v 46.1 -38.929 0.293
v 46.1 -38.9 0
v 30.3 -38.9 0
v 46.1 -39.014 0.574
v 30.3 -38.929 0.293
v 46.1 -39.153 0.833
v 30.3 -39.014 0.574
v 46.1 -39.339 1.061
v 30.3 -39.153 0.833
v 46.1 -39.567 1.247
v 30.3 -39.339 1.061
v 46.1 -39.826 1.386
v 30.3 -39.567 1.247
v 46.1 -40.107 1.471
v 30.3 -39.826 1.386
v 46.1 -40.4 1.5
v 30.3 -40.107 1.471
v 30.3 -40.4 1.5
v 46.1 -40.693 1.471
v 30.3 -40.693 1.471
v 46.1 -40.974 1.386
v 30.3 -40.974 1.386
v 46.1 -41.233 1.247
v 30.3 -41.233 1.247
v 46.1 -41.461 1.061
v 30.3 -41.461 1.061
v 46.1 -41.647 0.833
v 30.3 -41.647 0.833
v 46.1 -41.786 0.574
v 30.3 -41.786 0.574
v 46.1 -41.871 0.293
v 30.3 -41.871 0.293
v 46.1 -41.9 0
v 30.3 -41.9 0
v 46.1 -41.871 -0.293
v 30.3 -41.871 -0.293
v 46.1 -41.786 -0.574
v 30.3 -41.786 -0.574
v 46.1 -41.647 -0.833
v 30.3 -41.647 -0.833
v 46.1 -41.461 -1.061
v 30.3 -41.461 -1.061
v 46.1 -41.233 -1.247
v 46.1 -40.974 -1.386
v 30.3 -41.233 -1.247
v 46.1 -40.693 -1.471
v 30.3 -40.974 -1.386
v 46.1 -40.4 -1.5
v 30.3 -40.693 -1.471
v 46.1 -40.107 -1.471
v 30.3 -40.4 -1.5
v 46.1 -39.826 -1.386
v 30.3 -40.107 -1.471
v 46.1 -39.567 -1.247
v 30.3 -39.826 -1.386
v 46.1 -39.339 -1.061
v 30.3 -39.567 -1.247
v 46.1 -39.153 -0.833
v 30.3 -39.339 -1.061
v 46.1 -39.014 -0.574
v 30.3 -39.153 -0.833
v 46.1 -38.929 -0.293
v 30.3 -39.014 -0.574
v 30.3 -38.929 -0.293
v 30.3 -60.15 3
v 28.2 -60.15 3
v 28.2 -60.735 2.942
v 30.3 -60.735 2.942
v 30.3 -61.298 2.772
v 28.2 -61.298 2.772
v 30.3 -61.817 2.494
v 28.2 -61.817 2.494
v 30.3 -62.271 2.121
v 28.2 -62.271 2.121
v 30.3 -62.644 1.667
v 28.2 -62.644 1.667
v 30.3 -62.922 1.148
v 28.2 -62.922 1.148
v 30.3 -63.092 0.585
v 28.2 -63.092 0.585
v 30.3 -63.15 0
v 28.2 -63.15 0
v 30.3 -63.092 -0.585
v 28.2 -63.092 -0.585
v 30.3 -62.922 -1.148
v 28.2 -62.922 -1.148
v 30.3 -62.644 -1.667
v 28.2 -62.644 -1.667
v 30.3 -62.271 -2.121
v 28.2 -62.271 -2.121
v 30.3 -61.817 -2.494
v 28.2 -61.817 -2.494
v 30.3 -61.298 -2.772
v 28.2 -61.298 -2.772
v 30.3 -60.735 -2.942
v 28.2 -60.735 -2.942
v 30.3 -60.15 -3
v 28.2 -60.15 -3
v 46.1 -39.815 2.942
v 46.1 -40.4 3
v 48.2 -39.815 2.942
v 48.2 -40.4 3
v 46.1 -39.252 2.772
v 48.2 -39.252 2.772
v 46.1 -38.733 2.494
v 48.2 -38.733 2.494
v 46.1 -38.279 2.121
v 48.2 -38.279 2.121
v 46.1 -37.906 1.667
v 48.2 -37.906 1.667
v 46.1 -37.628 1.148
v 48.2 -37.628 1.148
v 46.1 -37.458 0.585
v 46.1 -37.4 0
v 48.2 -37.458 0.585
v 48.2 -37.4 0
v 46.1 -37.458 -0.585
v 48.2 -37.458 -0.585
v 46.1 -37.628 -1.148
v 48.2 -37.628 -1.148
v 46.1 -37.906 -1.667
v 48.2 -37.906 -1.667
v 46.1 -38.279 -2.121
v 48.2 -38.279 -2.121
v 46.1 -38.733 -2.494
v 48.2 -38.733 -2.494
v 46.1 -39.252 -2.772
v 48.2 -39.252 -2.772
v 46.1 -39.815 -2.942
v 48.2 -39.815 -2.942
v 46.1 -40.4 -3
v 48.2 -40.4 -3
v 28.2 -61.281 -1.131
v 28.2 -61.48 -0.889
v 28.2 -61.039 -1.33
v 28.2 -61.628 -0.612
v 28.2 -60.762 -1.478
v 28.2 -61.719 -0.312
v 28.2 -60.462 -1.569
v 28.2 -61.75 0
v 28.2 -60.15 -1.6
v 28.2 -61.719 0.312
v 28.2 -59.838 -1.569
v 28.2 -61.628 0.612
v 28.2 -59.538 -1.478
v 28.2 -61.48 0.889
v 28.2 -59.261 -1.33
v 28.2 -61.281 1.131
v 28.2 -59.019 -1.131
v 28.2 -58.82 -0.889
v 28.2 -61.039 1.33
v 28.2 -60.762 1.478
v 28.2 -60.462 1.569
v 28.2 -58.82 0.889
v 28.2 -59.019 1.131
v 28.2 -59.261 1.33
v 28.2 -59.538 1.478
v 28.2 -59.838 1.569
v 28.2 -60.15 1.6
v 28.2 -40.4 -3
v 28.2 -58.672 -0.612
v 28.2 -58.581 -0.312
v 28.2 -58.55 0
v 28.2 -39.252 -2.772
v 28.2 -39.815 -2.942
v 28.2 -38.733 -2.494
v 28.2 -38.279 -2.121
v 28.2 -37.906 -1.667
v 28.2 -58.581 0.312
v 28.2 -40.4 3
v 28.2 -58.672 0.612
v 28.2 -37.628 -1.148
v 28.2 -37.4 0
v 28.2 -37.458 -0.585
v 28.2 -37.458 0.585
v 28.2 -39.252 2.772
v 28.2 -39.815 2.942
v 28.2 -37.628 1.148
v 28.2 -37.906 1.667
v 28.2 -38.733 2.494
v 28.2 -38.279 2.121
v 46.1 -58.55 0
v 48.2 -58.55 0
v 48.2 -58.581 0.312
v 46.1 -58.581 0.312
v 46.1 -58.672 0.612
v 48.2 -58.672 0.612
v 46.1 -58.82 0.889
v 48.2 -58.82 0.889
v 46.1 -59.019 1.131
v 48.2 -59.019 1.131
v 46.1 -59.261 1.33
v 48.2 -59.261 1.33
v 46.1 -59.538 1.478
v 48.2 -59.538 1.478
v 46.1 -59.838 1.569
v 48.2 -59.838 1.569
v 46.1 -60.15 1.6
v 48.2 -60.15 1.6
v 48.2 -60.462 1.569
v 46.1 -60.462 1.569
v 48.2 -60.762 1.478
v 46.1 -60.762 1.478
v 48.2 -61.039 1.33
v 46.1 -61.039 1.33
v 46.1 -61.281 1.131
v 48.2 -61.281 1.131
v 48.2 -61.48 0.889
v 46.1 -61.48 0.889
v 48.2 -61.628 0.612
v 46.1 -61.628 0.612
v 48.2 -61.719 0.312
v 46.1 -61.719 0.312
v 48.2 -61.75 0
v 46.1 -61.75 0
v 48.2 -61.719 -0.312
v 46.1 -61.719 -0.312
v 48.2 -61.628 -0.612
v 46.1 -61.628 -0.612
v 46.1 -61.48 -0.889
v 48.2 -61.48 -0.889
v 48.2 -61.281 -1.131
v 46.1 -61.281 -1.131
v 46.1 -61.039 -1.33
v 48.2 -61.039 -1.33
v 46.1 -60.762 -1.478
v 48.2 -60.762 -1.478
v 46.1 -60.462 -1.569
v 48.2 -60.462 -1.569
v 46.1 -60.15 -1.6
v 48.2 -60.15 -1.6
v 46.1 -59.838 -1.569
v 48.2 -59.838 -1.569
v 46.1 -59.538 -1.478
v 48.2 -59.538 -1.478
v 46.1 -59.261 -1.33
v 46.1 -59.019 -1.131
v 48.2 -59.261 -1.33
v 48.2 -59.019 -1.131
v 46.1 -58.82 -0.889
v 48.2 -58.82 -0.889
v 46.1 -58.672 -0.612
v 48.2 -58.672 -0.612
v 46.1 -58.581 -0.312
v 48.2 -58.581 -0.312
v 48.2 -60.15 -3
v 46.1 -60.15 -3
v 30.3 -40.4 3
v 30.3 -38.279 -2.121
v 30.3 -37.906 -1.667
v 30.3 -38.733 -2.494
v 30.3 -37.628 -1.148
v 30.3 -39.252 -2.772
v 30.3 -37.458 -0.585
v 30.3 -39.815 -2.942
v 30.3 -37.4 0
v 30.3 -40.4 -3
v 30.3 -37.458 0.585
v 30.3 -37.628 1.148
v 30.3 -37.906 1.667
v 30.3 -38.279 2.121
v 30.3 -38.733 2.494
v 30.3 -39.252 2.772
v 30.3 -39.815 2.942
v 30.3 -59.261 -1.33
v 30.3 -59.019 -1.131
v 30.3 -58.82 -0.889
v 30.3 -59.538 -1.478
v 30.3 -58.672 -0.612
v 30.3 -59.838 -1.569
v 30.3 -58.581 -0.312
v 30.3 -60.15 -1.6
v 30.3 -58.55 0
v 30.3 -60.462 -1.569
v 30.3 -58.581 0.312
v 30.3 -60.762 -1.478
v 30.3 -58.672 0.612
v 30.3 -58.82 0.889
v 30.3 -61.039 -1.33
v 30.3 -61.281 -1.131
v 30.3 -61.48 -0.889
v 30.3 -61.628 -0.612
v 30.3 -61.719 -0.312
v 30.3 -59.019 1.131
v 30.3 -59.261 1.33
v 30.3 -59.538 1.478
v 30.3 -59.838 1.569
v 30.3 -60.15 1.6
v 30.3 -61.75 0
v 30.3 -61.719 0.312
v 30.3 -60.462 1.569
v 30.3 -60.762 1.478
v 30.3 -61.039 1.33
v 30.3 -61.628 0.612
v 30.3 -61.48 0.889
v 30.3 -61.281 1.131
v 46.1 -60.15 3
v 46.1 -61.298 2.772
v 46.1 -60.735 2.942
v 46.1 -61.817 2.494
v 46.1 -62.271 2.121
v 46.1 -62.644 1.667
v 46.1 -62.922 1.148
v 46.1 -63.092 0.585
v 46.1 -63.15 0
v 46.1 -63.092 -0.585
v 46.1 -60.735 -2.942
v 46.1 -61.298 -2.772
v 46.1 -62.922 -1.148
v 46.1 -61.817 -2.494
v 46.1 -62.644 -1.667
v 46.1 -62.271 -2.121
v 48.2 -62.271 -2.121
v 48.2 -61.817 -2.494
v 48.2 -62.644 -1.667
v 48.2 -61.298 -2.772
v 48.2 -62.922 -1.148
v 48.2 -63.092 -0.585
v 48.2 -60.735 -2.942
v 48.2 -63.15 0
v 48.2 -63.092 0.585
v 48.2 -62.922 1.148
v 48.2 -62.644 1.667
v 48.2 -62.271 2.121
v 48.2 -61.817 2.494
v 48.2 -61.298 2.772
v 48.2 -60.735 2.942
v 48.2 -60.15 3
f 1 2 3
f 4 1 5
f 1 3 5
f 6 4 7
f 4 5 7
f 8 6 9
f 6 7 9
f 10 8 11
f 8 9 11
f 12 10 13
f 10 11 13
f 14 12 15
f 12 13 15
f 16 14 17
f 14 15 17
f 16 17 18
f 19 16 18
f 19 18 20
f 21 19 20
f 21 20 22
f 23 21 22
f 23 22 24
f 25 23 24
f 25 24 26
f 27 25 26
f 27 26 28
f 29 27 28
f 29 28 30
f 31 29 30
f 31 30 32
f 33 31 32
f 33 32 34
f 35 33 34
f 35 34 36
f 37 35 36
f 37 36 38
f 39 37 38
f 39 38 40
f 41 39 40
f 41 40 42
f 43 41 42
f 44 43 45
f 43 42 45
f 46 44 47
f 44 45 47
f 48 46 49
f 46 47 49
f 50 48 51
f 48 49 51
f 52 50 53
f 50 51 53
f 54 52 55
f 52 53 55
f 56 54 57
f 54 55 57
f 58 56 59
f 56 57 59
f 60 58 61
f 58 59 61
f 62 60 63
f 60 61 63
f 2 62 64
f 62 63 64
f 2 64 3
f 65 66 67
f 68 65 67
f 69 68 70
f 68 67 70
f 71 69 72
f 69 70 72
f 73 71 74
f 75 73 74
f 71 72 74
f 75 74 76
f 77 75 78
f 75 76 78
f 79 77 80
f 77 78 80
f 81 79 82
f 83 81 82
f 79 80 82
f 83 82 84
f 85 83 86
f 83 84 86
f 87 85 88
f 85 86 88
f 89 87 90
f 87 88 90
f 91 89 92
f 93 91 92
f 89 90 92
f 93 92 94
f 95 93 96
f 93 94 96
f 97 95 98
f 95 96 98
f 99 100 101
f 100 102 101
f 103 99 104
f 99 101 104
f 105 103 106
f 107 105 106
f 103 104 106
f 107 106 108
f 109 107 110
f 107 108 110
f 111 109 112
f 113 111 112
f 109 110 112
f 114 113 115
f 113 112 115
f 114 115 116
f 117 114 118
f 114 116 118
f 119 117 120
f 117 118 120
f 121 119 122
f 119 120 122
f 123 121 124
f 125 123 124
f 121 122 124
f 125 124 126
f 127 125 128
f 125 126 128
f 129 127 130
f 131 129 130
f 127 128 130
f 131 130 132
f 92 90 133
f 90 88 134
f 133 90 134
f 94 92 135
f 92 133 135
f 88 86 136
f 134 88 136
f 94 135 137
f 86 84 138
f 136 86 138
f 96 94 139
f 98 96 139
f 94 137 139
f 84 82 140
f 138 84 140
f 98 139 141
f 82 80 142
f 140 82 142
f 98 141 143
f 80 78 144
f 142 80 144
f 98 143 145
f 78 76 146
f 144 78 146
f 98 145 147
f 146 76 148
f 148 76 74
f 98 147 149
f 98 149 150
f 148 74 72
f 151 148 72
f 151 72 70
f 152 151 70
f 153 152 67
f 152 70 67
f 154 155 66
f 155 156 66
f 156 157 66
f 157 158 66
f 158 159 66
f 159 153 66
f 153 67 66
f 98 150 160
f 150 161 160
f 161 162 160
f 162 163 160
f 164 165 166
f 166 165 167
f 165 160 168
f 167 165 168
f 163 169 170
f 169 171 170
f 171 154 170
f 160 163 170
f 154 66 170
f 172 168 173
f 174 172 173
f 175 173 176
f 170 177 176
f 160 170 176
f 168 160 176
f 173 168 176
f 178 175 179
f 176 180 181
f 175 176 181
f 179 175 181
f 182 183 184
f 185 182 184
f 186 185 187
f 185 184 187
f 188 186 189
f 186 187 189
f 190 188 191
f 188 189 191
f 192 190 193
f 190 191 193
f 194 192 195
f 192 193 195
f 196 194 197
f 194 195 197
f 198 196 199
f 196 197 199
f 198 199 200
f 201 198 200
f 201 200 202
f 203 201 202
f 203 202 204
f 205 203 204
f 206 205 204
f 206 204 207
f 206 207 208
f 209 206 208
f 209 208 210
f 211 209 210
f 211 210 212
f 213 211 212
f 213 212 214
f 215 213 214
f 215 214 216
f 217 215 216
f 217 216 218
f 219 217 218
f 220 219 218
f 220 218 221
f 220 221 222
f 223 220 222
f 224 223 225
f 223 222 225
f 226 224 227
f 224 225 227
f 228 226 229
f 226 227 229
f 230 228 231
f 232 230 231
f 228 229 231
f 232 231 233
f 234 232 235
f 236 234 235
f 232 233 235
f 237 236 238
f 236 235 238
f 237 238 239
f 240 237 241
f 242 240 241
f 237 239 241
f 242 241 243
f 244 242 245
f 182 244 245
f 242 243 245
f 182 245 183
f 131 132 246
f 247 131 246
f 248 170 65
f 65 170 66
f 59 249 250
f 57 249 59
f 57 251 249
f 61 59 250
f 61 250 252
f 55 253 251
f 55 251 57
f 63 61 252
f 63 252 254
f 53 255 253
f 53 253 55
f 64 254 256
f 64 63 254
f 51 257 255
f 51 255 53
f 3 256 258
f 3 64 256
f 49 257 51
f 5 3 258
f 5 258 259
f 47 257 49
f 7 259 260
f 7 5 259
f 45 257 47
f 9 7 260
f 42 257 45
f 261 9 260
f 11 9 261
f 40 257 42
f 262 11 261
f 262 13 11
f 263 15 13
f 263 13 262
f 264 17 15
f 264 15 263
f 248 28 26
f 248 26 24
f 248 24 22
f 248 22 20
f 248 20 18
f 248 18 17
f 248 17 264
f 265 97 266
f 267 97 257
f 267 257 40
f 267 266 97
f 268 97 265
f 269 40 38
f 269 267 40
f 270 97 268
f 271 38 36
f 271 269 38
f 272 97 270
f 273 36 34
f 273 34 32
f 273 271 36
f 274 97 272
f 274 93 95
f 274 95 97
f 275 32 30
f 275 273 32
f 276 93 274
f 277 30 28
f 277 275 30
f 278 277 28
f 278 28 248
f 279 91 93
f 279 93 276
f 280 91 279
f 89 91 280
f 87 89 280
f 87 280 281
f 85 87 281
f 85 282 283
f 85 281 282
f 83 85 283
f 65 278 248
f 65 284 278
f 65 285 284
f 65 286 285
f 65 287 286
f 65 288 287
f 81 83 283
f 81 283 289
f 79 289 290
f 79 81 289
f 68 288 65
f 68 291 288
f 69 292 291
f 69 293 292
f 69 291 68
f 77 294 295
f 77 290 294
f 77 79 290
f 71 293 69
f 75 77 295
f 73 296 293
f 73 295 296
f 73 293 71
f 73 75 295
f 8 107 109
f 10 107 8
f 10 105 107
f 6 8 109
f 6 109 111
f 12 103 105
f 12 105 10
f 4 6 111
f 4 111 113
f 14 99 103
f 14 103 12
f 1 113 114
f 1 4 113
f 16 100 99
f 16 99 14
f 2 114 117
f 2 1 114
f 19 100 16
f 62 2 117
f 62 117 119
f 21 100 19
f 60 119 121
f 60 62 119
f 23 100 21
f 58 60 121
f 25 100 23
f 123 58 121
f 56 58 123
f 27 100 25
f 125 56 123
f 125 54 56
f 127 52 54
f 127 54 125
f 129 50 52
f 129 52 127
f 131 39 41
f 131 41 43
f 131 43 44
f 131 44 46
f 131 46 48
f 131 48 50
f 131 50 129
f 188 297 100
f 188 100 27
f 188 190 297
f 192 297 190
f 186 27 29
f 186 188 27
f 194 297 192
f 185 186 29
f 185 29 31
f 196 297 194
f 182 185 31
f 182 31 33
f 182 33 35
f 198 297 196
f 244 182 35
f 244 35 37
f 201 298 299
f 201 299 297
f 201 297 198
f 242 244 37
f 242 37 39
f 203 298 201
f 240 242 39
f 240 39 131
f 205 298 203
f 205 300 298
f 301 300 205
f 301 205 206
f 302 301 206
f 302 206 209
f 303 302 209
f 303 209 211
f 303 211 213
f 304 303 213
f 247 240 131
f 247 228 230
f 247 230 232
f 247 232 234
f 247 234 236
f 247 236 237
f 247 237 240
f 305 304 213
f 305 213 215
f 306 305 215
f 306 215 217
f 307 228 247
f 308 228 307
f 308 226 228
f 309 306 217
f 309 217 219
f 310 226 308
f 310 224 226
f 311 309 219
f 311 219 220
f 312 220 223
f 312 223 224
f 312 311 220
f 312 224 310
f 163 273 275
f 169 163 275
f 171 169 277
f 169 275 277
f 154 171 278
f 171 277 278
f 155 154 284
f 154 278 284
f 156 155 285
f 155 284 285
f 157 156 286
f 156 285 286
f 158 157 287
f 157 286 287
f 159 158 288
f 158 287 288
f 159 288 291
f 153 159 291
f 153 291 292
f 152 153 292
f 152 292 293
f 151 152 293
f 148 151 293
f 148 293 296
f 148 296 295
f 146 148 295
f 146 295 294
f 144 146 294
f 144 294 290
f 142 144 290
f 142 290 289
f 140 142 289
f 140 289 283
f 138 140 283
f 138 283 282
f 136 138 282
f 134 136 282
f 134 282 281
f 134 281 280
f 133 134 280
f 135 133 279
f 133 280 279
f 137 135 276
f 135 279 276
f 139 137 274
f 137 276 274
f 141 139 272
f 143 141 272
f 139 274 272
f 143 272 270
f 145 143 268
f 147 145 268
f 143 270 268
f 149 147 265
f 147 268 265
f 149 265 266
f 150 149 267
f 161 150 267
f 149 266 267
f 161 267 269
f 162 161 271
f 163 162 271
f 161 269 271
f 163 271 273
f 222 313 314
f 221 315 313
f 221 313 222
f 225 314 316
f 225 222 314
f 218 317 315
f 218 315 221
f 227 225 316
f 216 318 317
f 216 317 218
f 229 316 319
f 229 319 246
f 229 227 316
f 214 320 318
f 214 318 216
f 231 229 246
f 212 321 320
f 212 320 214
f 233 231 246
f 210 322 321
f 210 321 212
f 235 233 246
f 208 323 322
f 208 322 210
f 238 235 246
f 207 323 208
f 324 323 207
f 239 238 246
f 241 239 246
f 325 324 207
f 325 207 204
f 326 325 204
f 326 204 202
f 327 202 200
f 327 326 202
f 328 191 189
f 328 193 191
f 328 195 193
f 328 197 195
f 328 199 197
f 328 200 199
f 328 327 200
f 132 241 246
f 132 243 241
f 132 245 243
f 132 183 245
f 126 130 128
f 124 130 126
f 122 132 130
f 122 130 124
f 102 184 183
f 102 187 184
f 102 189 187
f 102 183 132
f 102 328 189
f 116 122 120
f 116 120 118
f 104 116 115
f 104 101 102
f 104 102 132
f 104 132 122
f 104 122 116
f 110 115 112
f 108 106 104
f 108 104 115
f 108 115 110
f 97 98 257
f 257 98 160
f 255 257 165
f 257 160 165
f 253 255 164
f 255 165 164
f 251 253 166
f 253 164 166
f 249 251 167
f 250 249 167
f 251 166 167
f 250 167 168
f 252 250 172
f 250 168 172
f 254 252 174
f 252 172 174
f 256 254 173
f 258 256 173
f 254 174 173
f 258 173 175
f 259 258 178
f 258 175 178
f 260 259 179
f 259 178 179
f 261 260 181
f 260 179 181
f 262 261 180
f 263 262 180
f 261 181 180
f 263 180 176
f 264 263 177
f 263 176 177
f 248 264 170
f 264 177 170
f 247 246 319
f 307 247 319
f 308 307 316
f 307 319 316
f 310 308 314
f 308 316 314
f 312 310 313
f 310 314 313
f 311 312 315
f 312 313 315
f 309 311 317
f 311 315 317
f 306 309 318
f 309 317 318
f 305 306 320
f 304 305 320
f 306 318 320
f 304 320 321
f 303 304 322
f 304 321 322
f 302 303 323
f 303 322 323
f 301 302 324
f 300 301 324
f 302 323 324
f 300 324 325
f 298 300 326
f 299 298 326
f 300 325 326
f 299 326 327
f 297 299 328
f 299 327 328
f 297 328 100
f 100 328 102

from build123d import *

# Parameters (mm, degrees)
PAD139_DEPTH            = 2
SKETCH244_R             = 1.5
PAD140_DEPTH            = 16
PAD141_DEPTH            = 2
SKETCH246_R             = 1.5
PAD142_DEPTH            = 0.5
SKETCH247_R             = 1.5
PAD143_DEPTH            = 0.5
PAD143_FACE5_R          = 1.5
PAD212_DEPTH            = 0.1
PAD212_FACE4_R          = 1.5
PAD213_DEPTH            = 0.1
SKETCH353_R             = 1.6
POCKET170_DEPTH         = 22
BODY020_ROLL_ANGLE      = 90
BODY020_PLACEMENT_ANGLE = 90


with BuildPart() as part:
    # Sketch243 → Pad139 (new body)
    with BuildSketch(Plane.XY):
        with BuildLine():
            ThreePointArc((0, 3), (-3, 0), (0, -3))
            Line((0, -3), (19.75, -3))
            ThreePointArc((19.75, -3), (22.75, 0), (19.75, 3))
            Line((0, 3), (19.75, 3))
        make_face()
    extrude(amount=PAD139_DEPTH)

    # Sketch244 (on Face6 of Pad139) → Pad140 (join)
    with BuildSketch(Plane.XY.offset(2)):
        Circle(SKETCH244_R)
        with Locations((19.75, 0)):
            Circle(SKETCH244_R)
    extrude(amount=PAD140_DEPTH)

    # Sketch245 (on Face9 of Pad140) → Pad141 (join)
    with BuildSketch(Plane.XY.offset(18)):
        with BuildLine():
            ThreePointArc((0, 3), (-3, 0), (0, -3))
            Line((0, -3), (19.75, -3))
            ThreePointArc((19.75, -3), (22.75, 0), (19.75, 3))
            Line((0, 3), (19.75, 3))
        make_face()
    extrude(amount=PAD141_DEPTH)

    # Sketch246 (on Face14 of Pad141) → Pad142 (join)
    with BuildSketch(Plane.XY.offset(20)):
        Circle(SKETCH246_R)
    extrude(amount=PAD142_DEPTH)

    # Sketch247 (on Face4 of Pad142) → Pad143 (join)
    with BuildSketch(Plane(origin=(0, 0, 0), x_dir=(1, 0, 0), z_dir=(0, 0, -1))):
        Circle(SKETCH247_R)
    extrude(amount=PAD143_DEPTH)

    # Pad143 Face5 → Pad212 (add)
    with BuildSketch(Plane(origin=(9.875, 0, 2), x_dir=(0, 1, 0), z_dir=(0, 0, 1))):
        with BuildLine():
            ThreePointArc((3, 9.875), (0, 12.875), (-3, 9.875))
            Line((-3, 9.875), (-3, -9.875))
            ThreePointArc((-3, -9.875), (0, -12.875), (3, -9.875))
            Line((3, -9.875), (3, 9.875))
        make_face()
        with Locations((0, 9.875)):
            Circle(PAD143_FACE5_R, mode=Mode.SUBTRACT)
        with Locations((0, -9.875)):
            Circle(PAD143_FACE5_R, mode=Mode.SUBTRACT)
    extrude(amount=PAD212_DEPTH)

    # Pad212 Face4 → Pad213 (add)
    with BuildSketch(Plane(origin=(9.875, 0, 18), x_dir=(0, -1, 0), z_dir=(0, 0, -1))):
        with BuildLine():
            ThreePointArc((3, 9.875), (0, 12.875), (-3, 9.875))
            Line((-3, 9.875), (-3, -9.875))
            ThreePointArc((-3, -9.875), (0, -12.875), (3, -9.875))
            Line((3, -9.875), (3, 9.875))
        make_face()
        with Locations((0, 9.875)):
            Circle(PAD212_FACE4_R, mode=Mode.SUBTRACT)
        with Locations((0, -9.875)):
            Circle(PAD212_FACE4_R, mode=Mode.SUBTRACT)
    extrude(amount=PAD213_DEPTH)

    # Sketch353 (on Face3 of Pad213) → Pocket170 (cut)
    with BuildSketch(Plane.XY.offset(20.5)):
        Circle(SKETCH353_R)
    extrude(amount=-POCKET170_DEPTH, mode=Mode.SUBTRACT)


with BuildPart() as part_1:
    # Body020 roll: moved
    add(part.part.rotate(Axis((0, 0, 0), (1, 0, 0)), BODY020_ROLL_ANGLE))


with BuildPart() as part_2:
    # Body020 placement: moved
    add(part_1.part.moved(Location((28.2, -60.15, 0))).rotate(Axis((28.2, -60.15, 0), (0, 0, 1)), BODY020_PLACEMENT_ANGLE))


solid = part_2.part
